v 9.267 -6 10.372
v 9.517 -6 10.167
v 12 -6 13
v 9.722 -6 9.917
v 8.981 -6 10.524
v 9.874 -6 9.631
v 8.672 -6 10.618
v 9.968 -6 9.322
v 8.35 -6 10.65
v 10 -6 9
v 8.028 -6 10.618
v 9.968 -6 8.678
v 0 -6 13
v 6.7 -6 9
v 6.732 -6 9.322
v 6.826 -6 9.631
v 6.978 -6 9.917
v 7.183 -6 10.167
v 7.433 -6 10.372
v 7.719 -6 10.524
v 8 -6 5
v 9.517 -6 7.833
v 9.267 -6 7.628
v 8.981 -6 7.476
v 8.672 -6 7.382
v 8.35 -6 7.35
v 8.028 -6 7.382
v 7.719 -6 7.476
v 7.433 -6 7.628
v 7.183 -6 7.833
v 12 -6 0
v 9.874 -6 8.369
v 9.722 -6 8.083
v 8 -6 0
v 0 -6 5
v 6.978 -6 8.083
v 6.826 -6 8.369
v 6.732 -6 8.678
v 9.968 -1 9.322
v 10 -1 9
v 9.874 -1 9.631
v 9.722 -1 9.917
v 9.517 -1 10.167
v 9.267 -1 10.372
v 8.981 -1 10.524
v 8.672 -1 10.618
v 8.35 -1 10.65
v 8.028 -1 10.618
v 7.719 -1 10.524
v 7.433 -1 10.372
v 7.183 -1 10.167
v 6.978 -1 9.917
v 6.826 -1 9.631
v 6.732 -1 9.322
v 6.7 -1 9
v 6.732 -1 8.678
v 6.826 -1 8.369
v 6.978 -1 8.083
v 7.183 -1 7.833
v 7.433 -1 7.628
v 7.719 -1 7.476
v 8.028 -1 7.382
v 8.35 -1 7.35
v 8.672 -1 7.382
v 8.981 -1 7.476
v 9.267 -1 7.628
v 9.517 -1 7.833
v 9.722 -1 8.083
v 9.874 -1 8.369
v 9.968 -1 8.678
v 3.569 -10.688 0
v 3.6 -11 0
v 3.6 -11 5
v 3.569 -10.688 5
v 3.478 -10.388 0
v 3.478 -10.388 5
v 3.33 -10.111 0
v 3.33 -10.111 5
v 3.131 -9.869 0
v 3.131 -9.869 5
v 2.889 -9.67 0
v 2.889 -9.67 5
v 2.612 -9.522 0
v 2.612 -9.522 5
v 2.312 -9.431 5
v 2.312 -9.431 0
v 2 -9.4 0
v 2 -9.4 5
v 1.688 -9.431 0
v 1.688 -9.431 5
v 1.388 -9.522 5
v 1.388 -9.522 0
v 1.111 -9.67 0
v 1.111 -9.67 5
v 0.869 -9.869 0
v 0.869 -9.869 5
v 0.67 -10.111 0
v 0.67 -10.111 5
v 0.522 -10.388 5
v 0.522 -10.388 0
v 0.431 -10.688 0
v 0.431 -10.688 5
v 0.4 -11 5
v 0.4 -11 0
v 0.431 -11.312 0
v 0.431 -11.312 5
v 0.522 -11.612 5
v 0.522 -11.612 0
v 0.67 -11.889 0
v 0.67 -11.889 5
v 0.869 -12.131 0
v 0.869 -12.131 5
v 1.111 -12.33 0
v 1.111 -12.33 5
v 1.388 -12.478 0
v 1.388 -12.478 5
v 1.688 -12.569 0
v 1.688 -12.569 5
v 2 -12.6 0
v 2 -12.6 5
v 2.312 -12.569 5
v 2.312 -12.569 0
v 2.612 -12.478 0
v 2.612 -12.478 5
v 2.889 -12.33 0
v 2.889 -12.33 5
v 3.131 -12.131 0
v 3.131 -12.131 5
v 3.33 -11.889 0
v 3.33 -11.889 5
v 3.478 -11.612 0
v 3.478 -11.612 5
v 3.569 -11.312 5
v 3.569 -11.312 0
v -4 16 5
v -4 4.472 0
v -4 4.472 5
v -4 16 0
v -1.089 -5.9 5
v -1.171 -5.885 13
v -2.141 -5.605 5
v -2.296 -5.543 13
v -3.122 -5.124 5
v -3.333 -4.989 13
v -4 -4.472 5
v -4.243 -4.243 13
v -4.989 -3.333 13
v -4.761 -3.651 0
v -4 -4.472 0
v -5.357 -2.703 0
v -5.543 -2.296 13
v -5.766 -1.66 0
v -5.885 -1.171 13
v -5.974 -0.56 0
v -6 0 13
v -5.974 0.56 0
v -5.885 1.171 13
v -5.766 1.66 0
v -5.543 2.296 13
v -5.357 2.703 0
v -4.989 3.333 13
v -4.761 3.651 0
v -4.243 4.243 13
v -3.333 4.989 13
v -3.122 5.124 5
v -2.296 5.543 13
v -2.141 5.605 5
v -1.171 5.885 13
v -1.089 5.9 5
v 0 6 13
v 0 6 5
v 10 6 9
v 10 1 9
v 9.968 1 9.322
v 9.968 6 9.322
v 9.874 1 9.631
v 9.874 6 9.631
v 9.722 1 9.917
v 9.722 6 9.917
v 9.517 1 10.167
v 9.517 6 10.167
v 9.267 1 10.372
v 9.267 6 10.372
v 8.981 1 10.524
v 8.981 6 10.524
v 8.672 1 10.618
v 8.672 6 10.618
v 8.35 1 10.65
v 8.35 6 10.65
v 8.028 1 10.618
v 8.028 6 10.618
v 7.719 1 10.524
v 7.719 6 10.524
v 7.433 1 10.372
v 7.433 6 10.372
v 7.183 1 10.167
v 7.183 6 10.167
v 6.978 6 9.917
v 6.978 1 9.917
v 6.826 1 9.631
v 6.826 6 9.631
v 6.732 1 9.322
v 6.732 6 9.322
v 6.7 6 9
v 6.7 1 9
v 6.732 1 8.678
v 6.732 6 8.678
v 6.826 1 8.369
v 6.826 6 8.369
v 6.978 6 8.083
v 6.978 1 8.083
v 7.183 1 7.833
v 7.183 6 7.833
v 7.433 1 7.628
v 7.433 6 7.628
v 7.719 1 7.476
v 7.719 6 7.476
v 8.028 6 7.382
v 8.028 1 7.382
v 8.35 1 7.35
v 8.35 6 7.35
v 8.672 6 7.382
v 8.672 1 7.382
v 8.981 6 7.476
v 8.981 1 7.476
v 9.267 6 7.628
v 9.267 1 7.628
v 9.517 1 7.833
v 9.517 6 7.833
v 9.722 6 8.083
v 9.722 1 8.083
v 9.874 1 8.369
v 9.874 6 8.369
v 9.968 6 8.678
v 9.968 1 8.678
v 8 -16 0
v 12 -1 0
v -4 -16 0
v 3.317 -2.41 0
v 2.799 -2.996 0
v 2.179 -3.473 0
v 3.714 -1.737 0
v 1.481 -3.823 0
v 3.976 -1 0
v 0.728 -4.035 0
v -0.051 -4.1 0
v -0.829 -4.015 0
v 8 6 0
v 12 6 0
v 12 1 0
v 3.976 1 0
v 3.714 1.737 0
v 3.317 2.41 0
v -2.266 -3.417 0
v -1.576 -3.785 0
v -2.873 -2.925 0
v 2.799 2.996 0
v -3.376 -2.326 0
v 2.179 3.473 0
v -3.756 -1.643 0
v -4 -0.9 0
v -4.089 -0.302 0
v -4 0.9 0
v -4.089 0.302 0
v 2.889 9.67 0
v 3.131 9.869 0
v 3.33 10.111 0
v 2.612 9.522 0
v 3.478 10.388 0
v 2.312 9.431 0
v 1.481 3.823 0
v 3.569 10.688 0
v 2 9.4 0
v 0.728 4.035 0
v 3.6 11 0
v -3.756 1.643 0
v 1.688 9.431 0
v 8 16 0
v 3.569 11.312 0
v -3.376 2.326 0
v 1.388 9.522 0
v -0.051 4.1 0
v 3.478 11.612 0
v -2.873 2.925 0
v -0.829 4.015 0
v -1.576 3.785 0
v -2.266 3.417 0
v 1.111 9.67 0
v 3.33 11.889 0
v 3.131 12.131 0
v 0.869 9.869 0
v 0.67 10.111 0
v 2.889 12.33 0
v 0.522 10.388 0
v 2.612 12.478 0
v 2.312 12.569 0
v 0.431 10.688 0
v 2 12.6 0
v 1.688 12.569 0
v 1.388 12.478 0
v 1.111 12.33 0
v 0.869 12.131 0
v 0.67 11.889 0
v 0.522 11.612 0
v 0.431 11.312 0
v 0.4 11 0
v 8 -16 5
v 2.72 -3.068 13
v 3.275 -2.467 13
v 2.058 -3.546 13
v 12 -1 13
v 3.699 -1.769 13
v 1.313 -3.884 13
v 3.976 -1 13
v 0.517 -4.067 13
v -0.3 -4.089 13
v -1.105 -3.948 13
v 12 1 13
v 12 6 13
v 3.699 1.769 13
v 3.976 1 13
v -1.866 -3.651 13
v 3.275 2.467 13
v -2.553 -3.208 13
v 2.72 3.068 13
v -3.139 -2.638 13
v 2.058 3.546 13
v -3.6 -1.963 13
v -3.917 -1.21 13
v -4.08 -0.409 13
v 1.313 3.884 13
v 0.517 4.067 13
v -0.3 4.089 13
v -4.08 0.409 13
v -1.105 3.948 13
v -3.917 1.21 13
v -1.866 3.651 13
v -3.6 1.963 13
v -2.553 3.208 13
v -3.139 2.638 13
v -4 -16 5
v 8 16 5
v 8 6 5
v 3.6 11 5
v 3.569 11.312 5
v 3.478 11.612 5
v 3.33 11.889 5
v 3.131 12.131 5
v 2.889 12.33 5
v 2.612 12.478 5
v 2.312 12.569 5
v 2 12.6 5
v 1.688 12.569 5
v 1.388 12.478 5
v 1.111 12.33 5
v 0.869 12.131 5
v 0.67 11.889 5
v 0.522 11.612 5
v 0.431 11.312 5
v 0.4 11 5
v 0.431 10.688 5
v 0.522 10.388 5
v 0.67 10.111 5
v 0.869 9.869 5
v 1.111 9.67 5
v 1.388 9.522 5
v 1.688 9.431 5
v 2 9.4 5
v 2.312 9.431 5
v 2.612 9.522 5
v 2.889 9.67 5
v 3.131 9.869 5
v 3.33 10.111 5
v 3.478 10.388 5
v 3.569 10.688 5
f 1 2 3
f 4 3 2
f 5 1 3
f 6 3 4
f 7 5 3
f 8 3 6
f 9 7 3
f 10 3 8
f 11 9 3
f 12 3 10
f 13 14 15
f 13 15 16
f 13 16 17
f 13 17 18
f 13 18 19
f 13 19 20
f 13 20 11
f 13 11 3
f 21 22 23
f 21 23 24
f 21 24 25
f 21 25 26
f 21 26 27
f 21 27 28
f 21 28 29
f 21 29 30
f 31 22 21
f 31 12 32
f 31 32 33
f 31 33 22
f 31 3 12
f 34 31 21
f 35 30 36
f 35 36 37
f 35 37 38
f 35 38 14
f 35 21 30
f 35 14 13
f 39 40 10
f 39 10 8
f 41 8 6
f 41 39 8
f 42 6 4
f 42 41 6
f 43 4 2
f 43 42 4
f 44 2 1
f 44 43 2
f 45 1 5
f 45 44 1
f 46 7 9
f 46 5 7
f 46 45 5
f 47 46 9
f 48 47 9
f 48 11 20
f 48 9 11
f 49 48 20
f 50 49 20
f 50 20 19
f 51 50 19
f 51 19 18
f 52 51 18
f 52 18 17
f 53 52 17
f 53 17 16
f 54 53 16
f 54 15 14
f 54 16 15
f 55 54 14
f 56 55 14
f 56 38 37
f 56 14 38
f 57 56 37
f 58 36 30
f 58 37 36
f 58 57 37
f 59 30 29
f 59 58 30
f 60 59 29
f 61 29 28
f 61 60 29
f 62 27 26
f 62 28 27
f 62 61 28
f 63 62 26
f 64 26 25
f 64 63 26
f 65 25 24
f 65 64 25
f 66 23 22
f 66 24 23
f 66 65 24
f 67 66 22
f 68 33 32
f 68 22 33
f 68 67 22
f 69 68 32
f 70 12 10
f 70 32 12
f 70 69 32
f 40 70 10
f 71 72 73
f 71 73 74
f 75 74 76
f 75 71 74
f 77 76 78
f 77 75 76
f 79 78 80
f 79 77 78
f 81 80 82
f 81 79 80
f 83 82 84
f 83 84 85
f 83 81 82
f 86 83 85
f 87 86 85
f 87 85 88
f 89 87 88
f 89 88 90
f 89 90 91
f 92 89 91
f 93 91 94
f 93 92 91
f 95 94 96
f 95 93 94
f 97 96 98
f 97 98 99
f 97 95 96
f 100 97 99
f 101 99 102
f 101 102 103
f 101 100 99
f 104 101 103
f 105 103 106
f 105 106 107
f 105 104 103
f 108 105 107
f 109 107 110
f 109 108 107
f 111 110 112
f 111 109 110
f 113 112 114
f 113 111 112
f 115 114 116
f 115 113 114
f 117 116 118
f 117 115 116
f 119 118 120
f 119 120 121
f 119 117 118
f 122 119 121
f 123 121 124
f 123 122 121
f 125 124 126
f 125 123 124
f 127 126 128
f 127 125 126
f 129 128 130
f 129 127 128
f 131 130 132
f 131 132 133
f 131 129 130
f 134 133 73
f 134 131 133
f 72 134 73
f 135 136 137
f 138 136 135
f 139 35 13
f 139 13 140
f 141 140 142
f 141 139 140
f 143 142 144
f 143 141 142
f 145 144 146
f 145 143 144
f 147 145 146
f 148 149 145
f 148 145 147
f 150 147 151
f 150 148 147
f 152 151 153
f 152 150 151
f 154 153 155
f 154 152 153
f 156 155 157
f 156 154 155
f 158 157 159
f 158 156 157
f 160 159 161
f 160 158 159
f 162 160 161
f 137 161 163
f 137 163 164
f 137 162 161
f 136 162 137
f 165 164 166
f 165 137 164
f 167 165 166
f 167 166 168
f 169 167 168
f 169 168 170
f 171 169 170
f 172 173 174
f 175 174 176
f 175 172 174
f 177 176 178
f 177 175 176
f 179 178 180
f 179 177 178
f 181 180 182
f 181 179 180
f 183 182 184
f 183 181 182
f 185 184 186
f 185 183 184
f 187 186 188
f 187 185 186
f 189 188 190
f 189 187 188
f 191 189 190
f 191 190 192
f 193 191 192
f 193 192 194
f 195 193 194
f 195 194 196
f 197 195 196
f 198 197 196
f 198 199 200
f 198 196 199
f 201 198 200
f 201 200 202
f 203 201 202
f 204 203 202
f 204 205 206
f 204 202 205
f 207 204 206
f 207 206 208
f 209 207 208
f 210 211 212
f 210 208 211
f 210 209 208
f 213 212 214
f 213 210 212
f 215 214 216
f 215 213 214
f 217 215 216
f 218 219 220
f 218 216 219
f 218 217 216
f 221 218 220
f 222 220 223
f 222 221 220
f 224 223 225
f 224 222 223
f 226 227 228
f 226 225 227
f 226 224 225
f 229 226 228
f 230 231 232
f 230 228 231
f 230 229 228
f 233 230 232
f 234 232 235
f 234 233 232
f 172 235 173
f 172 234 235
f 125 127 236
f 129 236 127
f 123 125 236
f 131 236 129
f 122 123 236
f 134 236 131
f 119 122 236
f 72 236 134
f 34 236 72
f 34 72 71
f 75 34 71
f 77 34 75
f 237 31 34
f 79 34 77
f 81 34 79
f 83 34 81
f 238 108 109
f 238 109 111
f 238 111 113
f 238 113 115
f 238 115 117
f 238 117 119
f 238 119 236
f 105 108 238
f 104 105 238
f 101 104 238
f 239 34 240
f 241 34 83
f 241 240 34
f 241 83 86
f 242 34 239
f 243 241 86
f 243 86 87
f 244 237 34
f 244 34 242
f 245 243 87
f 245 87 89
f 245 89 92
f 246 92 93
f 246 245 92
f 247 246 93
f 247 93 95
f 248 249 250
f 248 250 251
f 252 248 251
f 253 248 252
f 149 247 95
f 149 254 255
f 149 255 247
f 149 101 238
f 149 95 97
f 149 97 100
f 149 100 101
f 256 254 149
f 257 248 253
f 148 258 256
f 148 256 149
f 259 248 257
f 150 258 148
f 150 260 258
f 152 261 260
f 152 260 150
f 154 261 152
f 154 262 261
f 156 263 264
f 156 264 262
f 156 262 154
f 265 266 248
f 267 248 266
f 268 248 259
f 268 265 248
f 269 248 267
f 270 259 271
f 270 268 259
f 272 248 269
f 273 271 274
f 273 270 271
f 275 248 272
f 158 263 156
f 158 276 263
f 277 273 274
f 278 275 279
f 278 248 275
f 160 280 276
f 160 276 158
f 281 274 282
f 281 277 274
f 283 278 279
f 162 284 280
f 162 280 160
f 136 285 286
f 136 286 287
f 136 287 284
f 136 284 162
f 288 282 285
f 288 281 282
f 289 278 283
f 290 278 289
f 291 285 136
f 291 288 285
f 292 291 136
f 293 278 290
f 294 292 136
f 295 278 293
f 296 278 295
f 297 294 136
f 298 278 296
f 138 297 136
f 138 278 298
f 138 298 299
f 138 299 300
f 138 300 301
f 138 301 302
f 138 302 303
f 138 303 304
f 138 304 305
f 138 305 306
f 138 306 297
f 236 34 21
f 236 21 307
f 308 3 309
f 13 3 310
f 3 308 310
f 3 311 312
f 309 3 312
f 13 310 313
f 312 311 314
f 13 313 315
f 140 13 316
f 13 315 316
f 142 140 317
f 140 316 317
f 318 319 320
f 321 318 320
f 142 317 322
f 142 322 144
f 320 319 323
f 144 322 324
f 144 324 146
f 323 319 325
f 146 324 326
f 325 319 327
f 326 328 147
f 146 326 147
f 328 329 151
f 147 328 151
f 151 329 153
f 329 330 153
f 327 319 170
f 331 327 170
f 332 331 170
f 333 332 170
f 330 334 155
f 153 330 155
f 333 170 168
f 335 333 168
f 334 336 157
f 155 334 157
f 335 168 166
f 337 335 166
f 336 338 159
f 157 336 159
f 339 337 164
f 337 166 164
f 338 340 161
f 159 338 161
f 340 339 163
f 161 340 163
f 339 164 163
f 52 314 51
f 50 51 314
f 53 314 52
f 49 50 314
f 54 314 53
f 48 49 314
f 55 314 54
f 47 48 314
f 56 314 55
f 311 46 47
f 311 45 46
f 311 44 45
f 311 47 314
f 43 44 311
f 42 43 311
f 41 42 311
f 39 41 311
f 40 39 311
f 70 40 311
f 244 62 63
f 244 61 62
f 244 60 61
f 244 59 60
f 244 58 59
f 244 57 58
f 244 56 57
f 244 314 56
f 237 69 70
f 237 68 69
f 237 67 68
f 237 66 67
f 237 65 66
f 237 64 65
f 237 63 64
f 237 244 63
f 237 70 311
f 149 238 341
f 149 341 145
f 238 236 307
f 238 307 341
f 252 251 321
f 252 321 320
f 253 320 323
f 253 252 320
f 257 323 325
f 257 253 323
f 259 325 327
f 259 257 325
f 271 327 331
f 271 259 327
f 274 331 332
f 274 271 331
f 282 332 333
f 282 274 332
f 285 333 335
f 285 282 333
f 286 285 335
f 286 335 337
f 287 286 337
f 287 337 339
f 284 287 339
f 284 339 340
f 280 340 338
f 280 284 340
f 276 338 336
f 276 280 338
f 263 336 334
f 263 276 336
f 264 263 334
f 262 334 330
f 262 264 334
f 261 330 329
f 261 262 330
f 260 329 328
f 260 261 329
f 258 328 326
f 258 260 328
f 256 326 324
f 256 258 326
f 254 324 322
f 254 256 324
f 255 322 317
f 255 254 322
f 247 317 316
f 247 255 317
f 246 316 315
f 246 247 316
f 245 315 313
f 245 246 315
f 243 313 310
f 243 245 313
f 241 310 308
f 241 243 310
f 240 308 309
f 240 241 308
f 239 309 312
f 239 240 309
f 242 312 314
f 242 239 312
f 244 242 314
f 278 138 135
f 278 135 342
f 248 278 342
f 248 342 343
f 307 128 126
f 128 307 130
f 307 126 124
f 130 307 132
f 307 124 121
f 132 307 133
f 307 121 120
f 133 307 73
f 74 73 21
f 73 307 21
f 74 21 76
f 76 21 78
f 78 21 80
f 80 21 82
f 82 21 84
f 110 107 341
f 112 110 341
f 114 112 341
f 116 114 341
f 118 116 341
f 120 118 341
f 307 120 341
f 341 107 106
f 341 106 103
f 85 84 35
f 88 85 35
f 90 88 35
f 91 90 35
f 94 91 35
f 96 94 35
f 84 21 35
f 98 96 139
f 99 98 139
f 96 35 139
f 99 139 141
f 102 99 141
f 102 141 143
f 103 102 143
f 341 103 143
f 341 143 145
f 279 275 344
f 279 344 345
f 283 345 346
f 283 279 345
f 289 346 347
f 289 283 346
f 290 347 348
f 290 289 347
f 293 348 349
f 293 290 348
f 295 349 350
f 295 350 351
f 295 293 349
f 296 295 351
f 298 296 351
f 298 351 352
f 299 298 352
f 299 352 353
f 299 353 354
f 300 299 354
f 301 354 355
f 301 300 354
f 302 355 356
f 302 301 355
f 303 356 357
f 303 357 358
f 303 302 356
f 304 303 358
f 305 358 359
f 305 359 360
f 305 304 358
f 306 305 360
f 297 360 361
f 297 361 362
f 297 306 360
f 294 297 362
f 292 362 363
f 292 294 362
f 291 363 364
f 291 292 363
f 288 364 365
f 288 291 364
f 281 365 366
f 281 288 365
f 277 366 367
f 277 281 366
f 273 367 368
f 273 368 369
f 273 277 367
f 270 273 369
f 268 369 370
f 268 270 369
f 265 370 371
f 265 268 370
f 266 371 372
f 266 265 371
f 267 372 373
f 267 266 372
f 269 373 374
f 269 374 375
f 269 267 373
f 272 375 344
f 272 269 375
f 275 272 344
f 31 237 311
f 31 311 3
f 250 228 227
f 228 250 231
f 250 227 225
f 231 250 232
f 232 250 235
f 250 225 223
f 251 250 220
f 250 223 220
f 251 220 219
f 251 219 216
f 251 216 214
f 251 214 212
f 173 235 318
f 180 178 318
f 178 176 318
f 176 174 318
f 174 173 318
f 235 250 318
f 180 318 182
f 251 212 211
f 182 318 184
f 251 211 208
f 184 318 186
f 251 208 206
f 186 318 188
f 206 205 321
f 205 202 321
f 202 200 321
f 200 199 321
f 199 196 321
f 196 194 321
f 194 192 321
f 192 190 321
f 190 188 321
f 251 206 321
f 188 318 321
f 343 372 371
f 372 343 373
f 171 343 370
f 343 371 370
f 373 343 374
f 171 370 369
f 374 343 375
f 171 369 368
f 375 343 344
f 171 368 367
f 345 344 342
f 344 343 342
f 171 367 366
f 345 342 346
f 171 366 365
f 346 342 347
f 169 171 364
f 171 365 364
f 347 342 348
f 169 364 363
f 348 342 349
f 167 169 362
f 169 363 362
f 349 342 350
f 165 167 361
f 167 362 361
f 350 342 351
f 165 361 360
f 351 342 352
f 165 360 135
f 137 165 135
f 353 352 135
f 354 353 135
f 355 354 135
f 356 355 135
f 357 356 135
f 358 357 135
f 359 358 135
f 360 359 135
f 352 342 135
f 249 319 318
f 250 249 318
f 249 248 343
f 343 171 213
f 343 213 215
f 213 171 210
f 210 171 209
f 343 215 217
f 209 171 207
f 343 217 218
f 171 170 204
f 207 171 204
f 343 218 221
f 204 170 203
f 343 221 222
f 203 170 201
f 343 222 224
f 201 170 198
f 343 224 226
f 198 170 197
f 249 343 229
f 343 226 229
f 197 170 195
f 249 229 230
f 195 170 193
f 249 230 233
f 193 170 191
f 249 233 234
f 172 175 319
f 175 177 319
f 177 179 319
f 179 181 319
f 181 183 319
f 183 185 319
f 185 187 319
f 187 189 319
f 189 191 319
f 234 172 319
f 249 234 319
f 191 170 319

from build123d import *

# Parameters (mm, degrees)
ESBO_O1_R                     = 1.6
RESSALTO_EXTRUS_O1_DEPTH      = 5
RESSALTO_EXTRUS_O1_2_DEPTH    = 5
RESSALTO_EXTRUS_O2_DEPTH      = 8
RESSALTO_EXTRUS_O2_DEPTH_BACK = 5
ESBO_O3_R                     = 1.65
CORTE_EXTRUS_O1_DEPTH         = 23
CORTE_EXTRUS_O1_DEPTH_BACK    = 11


with BuildPart() as part:
    # Esboço1 → Ressalto-extrusão1 (new body)
    with BuildSketch(Plane.XY):
        with BuildLine():
            ThreePointArc((-4, -0.9), (-0.051399019, -4.099677809), (3.97617907, -1))
            Line((3.97617907, -1), (8, -1))
            Line((8, -1), (8, -16))
            Line((8, -16), (-4, -16))
            Line((-4, -16), (-4, -0.9))
        make_face()
        with Locations((2, -11)):
            Circle(ESBO_O1_R, mode=Mode.SUBTRACT)
    extrude(amount=RESSALTO_EXTRUS_O1_DEPTH)



with BuildPart() as body_2:
    # Esboço1 → Ressalto-extrus_o1 2 (new body)
    with BuildSketch(Plane.XY):
        with BuildLine():
            ThreePointArc((3.97617907, 1), (-0.051399019, 4.099677809), (-4, 0.9))
            Line((-4, 0.9), (-4, 16))
            Line((-4, 16), (8, 16))
            Line((8, 16), (8, 1))
            Line((8, 1), (3.97617907, 1))
        make_face()
        with Locations((2, 11)):
            Circle(ESBO_O1_R, mode=Mode.SUBTRACT)
    extrude(amount=RESSALTO_EXTRUS_O1_2_DEPTH)


with BuildPart() as part_1:
    add(part.part)

    add(body_2.part)  # Ressalto-extrusão2 merges body 2
    # Esboço2 → Ressalto-extrusão2 (add, two sides)
    with BuildSketch(Plane.XY.offset(5)) as ressalto_extrus_o2_sk:
        with BuildLine():
            Line((12, 6), (12, 1))
            Line((12, 1), (3.97617907, 1))
            ThreePointArc((3.97617907, 1), (-4.1, 0), (3.97617907, -1))
            Line((3.97617907, -1), (12, -1))
            Line((12, -1), (12, -6))
            Line((12, -6), (0, -6))
            ThreePointArc((0, -6), (-6, 0), (0, 6))
            Line((0, 6), (12, 6))
        make_face()
    extrude(amount=RESSALTO_EXTRUS_O2_DEPTH)
    extrude(ressalto_extrus_o2_sk.sketch, amount=-RESSALTO_EXTRUS_O2_DEPTH_BACK)

    # Esboço3 → Corte-extrusão1 (cut, two sides)
    with BuildSketch(Plane.XZ.offset(-6)) as corte_extrus_o1_sk:
        with Locations((8.35, 9)):
            Circle(ESBO_O3_R)
    extrude(amount=CORTE_EXTRUS_O1_DEPTH, mode=Mode.SUBTRACT)
    extrude(corte_extrus_o1_sk.sketch, amount=-CORTE_EXTRUS_O1_DEPTH_BACK, mode=Mode.SUBTRACT)


solid = part_1.part
